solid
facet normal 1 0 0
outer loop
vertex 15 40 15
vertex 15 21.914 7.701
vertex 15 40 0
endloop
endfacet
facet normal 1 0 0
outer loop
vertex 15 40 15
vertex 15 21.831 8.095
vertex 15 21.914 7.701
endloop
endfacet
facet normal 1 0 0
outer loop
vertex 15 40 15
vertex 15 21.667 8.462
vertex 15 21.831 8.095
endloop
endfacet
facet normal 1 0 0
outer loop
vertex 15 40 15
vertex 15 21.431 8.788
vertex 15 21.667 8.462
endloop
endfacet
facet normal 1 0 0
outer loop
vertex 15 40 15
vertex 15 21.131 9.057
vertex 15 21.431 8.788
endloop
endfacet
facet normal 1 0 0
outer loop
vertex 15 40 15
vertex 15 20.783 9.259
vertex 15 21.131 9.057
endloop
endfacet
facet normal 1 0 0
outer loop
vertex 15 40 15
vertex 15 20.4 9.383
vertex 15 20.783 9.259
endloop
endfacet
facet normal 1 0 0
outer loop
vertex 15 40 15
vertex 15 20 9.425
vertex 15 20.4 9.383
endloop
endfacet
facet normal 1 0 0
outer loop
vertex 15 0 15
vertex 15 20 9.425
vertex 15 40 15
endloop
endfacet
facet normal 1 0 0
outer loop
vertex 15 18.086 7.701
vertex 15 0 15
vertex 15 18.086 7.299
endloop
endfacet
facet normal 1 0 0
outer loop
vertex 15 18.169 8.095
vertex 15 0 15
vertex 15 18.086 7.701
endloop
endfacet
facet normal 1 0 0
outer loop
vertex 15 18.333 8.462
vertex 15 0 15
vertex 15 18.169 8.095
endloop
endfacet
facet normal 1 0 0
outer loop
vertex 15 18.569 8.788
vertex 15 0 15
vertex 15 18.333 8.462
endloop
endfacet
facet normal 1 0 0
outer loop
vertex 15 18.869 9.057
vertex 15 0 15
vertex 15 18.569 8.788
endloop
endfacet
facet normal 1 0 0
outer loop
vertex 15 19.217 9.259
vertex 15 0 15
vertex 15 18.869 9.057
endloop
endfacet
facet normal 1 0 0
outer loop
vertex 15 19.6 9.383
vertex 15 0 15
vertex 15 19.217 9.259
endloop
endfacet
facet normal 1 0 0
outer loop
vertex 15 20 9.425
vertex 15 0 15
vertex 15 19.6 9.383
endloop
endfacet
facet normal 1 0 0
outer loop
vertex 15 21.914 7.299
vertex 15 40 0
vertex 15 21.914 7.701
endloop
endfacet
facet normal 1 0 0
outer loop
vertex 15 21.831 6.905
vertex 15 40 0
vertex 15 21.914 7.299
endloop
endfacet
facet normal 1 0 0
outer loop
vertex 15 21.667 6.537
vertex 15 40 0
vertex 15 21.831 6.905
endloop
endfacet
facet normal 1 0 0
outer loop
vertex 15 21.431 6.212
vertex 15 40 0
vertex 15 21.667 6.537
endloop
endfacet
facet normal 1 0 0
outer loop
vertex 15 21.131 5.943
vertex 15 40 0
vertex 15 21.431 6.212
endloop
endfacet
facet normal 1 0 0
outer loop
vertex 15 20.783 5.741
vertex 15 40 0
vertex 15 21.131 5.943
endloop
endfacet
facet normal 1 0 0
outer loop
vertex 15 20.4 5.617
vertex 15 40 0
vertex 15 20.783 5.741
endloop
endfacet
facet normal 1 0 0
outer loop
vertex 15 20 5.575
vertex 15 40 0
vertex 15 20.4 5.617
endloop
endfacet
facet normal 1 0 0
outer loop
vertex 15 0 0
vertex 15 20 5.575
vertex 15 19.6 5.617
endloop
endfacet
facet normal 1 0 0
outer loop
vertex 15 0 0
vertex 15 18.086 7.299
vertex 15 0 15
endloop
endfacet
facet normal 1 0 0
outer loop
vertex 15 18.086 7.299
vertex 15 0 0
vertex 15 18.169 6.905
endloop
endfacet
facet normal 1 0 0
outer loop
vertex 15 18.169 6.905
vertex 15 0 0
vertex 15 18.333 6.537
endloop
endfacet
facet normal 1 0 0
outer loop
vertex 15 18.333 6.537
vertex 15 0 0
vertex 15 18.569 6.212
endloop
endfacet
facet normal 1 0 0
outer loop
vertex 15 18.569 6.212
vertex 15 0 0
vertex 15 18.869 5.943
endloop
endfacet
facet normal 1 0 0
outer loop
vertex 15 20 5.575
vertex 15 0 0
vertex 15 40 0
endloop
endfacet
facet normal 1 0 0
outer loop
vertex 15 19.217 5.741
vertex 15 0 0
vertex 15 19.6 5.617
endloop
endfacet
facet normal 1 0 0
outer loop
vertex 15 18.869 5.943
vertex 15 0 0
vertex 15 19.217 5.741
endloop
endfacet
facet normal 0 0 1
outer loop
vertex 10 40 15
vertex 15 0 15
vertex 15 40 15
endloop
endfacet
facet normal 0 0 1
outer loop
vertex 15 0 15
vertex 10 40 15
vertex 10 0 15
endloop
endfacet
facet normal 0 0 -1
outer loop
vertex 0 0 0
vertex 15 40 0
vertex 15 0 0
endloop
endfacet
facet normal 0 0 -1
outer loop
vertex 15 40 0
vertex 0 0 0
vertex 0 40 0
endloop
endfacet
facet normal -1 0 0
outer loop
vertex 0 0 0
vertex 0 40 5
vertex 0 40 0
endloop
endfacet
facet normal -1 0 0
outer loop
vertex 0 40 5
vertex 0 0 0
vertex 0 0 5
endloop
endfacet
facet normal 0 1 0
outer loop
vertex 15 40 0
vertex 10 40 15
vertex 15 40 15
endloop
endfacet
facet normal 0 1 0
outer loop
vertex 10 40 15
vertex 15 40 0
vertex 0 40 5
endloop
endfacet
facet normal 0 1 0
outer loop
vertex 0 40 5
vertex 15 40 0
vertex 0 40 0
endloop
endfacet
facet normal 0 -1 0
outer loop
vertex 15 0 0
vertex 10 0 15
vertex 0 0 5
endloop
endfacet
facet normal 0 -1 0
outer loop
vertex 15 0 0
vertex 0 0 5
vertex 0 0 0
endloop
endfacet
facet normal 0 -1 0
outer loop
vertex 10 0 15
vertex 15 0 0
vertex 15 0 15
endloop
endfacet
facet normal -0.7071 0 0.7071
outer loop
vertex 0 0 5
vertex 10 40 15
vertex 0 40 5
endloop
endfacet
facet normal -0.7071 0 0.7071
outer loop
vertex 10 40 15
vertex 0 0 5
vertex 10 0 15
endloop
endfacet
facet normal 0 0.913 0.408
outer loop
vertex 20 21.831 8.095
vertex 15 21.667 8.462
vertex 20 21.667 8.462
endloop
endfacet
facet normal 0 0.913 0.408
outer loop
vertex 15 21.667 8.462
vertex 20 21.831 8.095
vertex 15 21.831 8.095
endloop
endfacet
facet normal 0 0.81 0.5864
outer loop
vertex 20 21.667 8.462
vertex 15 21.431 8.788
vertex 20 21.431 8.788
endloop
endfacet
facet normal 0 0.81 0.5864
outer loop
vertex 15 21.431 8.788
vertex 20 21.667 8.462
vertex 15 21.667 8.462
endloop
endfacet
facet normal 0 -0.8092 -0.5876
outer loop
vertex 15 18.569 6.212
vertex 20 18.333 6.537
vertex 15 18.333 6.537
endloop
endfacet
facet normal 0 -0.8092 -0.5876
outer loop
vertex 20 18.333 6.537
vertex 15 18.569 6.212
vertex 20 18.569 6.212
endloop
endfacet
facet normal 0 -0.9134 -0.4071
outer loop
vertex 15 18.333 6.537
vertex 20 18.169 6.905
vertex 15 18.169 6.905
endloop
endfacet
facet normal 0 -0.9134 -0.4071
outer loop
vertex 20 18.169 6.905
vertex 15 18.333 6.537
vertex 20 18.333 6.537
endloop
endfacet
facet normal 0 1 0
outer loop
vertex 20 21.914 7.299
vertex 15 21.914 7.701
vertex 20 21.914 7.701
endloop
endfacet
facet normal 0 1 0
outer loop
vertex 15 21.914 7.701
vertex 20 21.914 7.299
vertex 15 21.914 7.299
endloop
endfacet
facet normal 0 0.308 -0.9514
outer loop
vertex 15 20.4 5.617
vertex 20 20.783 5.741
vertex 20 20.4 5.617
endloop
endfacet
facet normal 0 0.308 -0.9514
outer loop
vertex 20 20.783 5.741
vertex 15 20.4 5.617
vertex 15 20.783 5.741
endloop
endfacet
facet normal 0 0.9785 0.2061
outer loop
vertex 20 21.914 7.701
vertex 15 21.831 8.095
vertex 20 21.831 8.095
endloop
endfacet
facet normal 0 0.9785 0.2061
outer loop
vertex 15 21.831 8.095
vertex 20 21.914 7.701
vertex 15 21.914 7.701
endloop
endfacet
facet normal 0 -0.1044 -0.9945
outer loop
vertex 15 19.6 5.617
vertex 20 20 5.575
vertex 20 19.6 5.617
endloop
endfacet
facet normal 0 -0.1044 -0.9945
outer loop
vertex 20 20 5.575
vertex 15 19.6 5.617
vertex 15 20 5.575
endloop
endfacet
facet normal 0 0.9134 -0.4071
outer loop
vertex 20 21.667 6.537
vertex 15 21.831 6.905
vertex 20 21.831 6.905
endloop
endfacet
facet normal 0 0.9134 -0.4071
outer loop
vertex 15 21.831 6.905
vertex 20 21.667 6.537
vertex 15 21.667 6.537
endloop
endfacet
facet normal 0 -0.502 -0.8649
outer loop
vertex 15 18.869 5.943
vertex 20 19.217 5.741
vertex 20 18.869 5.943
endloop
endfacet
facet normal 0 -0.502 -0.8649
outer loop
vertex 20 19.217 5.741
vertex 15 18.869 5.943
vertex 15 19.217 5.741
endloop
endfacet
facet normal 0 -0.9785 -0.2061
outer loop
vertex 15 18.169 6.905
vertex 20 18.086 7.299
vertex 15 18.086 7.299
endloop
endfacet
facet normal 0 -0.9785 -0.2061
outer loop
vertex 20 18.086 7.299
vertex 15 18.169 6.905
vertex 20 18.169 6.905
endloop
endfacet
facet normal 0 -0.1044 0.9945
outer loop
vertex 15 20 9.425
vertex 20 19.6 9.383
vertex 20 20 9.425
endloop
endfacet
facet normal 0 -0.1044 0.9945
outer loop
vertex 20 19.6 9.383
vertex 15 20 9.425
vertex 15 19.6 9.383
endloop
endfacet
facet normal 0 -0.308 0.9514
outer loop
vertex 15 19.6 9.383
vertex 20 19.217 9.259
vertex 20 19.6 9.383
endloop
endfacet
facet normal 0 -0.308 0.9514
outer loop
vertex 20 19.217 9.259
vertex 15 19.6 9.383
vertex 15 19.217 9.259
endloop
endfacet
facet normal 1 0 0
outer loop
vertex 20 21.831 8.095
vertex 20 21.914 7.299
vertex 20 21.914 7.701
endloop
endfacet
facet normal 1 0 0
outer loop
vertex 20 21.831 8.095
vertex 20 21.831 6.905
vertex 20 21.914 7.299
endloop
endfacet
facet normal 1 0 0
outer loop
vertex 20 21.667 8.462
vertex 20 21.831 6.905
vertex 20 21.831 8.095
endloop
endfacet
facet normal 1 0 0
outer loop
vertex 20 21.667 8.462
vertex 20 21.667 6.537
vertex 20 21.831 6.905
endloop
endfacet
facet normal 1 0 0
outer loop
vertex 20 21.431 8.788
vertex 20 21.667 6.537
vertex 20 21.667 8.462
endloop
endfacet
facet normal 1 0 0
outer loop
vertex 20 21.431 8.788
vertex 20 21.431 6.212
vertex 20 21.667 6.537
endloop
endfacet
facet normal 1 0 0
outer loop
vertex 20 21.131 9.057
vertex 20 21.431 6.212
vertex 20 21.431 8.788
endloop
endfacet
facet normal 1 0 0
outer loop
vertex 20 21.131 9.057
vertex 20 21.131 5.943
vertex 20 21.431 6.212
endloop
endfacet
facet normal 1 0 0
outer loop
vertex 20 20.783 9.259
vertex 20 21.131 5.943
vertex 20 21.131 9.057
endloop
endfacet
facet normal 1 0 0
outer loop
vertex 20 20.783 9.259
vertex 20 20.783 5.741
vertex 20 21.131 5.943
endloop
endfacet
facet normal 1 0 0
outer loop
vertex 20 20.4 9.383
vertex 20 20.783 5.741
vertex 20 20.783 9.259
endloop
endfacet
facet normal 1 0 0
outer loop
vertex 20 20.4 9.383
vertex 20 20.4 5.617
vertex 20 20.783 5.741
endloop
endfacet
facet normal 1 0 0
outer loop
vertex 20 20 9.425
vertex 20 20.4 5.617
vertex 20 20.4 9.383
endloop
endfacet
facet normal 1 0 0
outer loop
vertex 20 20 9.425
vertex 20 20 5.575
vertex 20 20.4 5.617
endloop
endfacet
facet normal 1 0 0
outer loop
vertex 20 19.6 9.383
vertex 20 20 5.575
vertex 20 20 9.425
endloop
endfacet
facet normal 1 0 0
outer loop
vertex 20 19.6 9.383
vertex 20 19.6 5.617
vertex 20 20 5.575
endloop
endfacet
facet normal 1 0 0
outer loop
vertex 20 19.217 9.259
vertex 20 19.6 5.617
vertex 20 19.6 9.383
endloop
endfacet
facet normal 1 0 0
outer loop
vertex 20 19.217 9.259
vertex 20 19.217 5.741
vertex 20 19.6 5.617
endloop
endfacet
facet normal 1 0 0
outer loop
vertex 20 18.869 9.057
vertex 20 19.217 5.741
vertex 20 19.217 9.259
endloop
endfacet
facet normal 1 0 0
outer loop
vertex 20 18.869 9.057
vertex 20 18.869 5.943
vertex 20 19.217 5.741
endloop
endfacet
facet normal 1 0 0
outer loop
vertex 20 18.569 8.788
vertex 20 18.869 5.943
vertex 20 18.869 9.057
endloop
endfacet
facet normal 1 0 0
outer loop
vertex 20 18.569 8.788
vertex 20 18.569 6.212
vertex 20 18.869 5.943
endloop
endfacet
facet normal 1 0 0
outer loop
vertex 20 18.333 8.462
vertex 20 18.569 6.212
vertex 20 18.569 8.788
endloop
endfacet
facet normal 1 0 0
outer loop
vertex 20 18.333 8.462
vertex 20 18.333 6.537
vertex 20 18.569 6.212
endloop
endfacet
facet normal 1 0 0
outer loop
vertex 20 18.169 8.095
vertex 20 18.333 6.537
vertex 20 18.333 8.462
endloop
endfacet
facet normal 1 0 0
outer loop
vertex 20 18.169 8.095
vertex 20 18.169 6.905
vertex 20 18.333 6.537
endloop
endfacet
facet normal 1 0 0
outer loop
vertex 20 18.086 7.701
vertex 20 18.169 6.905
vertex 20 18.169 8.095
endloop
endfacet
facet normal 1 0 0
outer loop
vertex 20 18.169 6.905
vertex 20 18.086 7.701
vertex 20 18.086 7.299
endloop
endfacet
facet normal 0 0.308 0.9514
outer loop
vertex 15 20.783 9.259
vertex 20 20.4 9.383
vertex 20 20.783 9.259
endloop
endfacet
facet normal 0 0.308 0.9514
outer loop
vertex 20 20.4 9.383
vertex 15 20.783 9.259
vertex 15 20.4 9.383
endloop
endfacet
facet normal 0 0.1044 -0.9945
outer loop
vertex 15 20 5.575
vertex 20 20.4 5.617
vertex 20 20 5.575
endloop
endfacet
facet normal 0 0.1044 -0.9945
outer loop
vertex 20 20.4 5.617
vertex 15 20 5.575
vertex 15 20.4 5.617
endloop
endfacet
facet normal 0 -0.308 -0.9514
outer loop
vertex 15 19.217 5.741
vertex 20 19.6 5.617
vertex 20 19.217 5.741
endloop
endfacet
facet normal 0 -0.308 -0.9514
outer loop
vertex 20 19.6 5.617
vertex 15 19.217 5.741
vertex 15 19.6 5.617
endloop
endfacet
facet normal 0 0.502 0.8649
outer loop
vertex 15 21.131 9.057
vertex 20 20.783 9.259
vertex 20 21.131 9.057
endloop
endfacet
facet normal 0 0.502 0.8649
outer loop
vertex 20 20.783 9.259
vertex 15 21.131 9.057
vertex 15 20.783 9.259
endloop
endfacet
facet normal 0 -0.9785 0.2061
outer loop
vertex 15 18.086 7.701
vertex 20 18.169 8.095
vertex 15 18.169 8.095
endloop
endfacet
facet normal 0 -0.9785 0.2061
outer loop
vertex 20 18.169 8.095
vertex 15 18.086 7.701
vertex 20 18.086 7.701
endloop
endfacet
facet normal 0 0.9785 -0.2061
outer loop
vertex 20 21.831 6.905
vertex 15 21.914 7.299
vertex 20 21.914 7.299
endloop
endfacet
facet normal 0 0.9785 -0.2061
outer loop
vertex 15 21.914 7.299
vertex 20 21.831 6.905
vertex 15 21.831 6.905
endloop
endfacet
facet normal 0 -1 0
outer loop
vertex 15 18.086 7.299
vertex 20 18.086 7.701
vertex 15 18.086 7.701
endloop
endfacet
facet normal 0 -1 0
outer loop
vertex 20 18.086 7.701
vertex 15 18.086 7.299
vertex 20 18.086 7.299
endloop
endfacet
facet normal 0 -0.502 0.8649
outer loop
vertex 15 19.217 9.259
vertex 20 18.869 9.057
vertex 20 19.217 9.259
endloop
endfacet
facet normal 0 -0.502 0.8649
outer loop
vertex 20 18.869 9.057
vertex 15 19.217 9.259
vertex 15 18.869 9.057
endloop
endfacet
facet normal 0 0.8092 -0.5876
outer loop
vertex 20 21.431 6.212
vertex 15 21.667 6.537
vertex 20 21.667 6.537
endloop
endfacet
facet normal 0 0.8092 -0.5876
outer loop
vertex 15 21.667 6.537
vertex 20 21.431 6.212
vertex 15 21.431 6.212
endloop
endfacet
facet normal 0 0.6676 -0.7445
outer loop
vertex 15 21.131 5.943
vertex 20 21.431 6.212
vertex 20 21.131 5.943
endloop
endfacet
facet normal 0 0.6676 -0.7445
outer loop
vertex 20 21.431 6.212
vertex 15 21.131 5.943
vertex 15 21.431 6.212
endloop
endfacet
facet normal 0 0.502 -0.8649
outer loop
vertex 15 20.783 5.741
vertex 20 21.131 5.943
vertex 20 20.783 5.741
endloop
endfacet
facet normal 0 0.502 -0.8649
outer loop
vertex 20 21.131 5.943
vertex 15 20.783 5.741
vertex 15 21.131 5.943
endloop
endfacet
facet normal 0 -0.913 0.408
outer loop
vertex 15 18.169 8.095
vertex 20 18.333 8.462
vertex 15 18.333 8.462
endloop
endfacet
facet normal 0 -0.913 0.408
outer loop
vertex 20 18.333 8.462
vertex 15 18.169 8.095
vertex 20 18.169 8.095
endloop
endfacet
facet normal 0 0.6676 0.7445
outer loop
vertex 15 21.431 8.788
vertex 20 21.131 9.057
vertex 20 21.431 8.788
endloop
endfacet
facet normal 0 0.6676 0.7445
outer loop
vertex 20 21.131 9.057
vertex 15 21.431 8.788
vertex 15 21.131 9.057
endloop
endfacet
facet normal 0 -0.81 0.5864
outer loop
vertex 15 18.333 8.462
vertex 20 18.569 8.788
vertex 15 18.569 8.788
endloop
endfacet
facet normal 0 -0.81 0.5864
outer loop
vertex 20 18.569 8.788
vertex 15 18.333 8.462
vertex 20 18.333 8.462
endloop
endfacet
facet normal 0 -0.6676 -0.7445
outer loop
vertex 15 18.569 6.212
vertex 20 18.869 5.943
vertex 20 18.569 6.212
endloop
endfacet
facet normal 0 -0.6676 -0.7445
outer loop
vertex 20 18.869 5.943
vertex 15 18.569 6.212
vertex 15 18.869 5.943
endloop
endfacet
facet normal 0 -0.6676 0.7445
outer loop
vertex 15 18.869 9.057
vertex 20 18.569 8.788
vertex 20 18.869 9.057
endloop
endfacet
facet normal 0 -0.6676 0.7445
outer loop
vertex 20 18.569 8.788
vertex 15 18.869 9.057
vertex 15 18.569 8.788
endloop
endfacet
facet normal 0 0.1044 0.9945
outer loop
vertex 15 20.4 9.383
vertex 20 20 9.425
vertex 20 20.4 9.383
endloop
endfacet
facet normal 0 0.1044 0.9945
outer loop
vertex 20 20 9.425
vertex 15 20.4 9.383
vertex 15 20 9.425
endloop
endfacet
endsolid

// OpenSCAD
feet_height = 15;
peg_radius = 1.925;
feet_width = 40;
chamfer_distance = feet_height / 3;

module cut_prism(l,w,h) {
    color("cyan"){
        polyhedron(
            points=[[0,0,0], [0,l,0], [0,l,h],[0,0,h], [w,0,h], [w,l,h]],
            faces=[[0,1,2,3],[5,4,3,2],[0,4,5,1],[0,3,4],[5,2,1]]
            );
        }
}

union(){
    difference() {
        cube([feet_height,feet_width,feet_height]);
        translate([0,0,ceil(feet_height / 3) ]){
                cut_prism(feet_width,feet_height - chamfer_distance,feet_height - chamfer_distance);
            }
    }
    
    translate([feet_height, feet_width / 2, feet_height / 2]){
        rotate([0,90,0]){
            cylinder(h= 5, r = 1.925, $fn=30);
        }
    }
}
